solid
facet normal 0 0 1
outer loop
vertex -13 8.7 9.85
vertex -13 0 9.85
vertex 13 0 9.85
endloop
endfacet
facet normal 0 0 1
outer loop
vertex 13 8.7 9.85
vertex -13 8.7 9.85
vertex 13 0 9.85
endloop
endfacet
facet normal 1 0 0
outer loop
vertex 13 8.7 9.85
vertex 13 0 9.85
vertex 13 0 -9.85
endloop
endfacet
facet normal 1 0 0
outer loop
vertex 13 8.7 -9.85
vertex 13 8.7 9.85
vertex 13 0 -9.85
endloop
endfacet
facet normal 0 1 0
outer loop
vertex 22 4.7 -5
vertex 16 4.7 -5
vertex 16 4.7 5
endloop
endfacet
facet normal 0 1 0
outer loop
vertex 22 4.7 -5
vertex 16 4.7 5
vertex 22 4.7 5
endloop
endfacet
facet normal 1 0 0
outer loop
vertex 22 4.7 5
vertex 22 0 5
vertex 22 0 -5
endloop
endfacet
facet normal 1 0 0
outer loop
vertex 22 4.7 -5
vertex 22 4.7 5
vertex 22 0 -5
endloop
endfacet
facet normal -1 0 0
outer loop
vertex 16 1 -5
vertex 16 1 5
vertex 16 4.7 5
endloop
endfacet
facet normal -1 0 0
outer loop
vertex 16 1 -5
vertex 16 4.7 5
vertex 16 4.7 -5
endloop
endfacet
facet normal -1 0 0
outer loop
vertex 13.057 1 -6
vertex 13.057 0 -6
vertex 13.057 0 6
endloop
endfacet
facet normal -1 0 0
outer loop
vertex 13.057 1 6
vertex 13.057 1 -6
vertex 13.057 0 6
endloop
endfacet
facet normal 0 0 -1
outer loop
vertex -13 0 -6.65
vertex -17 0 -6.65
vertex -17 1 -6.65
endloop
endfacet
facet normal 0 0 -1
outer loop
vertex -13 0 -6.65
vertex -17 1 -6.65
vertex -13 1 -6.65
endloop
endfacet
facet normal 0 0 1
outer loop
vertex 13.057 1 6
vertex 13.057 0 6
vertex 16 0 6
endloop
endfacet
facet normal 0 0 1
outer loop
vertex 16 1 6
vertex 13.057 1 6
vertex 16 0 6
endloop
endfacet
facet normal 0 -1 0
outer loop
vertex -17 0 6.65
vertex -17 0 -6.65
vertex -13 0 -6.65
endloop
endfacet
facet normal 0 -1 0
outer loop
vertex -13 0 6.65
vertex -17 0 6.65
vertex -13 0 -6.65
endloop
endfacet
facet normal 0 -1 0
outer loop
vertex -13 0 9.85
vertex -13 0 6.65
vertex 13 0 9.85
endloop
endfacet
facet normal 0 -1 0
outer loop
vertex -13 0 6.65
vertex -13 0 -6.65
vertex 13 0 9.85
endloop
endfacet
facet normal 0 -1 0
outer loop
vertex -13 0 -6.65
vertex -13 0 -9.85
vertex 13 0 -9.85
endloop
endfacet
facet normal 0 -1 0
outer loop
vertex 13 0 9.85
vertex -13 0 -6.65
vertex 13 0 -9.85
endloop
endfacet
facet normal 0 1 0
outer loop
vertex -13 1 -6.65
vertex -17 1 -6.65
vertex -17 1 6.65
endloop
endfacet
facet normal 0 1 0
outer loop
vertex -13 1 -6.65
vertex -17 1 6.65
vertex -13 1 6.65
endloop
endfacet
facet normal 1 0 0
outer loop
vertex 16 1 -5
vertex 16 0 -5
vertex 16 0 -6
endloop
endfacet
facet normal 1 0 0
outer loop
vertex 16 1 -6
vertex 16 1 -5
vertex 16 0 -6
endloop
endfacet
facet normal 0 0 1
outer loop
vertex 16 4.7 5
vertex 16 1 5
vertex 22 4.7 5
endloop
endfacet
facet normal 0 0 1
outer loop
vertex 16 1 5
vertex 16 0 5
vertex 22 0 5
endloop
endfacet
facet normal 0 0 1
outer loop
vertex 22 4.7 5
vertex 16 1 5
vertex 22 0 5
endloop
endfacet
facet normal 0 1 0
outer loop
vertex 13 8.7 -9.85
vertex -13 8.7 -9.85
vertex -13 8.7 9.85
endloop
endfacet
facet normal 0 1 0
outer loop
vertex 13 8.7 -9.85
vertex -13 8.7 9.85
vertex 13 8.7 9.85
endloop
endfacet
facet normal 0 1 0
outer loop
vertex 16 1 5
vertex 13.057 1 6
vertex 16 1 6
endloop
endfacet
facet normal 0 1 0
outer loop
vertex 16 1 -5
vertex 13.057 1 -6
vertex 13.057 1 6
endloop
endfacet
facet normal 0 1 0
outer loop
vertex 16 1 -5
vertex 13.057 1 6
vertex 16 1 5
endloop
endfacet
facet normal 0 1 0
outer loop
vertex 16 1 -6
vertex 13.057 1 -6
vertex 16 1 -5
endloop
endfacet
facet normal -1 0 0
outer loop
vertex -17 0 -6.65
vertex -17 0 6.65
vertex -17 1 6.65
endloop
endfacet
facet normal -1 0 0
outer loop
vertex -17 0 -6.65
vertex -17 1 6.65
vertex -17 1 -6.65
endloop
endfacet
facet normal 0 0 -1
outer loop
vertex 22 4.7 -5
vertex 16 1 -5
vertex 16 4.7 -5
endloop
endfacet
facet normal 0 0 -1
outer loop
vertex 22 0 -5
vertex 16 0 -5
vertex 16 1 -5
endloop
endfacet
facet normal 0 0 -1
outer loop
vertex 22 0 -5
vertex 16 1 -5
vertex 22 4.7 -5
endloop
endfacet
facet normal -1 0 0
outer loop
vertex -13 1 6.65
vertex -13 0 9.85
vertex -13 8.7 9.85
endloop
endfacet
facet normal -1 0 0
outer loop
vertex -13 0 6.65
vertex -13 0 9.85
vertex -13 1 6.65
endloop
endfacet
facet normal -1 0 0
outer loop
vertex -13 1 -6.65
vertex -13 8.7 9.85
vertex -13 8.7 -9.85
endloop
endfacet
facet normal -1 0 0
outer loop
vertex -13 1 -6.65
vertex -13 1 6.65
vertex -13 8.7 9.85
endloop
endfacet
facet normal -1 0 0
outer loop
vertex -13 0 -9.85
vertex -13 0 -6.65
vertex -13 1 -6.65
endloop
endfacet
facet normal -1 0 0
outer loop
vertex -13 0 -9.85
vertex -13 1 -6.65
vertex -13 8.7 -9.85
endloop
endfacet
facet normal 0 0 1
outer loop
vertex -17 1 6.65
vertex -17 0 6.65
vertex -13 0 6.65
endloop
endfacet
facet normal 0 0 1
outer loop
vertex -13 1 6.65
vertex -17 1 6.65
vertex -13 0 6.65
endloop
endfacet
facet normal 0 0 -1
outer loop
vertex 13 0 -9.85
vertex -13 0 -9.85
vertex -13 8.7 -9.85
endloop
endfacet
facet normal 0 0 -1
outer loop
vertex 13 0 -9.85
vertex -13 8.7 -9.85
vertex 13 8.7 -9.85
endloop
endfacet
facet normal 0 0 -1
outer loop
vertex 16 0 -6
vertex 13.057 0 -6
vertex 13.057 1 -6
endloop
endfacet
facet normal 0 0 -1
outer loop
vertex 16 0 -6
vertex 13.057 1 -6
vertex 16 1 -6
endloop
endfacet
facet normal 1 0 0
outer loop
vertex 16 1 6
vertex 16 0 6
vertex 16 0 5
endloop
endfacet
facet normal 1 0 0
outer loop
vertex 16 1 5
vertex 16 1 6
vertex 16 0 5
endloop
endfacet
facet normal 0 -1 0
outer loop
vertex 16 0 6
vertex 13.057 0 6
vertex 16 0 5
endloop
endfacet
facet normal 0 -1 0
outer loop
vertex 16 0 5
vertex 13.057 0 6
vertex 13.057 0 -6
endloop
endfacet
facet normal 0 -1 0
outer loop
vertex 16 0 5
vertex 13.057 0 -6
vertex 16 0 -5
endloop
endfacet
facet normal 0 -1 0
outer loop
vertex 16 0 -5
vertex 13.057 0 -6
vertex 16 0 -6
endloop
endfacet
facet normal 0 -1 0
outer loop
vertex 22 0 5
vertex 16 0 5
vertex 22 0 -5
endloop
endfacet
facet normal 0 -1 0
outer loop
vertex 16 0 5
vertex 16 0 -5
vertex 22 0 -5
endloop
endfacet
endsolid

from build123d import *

# Parameters (mm, degrees)
SKETCH_1_W        = 4
SKETCH_1_H        = 13.3
EXTRUDE_1_DEPTH   = 1
SKETCH_1_W_2      = 2.942731278
SKETCH_1_H_2      = 12
EXTRUDE_1_2_DEPTH = 1
EXTRUDE_2_DEPTH   = 8.7
SKETCH_1_5_W      = 6
SKETCH_1_5_H      = 10
EXTRUDE_3_DEPTH   = 4.7


with BuildPart() as part:
    # Эскиз1 → Бобышка-Вытянуть1 (new body)
    with BuildSketch(Plane(origin=(0, 0, 0), x_dir=(1, 0, 0), z_dir=(0, 1, 0))):
        with Locations((-15, 0)):
            Rectangle(SKETCH_1_W, SKETCH_1_H)
    extrude(amount=EXTRUDE_1_DEPTH)

    # Эскиз1<4> → Бобышка-Вытянуть2 (add)
    with BuildSketch(Plane(origin=(0, 0, 0), x_dir=(1, 0, 0), z_dir=(0, 1, 0))):
        Polygon((13, 5), (13, 9.85), (-13, 9.85), (-13, 6.65), (-13, -6.65), (-13, -9.85), (13, -9.85), (13, -5), align=None)
    extrude(amount=EXTRUDE_2_DEPTH)


with BuildPart() as body_2:
    # Эскиз1 → Extrude 1 2 (new body)
    with BuildSketch(Plane(origin=(0, 0, 0), x_dir=(1, 0, 0), z_dir=(0, 1, 0))):
        with Locations((14.528634361, 0)):
            Rectangle(SKETCH_1_W_2, SKETCH_1_H_2)
    extrude(amount=EXTRUDE_1_2_DEPTH)

    # Эскиз1<5> → Бобышка-Вытянуть3 (add)
    with BuildSketch(Plane(origin=(0, 0, 0), x_dir=(1, 0, 0), z_dir=(0, 1, 0))):
        with Locations((19, 0)):
            Rectangle(SKETCH_1_5_W, SKETCH_1_5_H)
    extrude(amount=EXTRUDE_3_DEPTH)


solid = Compound([part.part, body_2.part])
